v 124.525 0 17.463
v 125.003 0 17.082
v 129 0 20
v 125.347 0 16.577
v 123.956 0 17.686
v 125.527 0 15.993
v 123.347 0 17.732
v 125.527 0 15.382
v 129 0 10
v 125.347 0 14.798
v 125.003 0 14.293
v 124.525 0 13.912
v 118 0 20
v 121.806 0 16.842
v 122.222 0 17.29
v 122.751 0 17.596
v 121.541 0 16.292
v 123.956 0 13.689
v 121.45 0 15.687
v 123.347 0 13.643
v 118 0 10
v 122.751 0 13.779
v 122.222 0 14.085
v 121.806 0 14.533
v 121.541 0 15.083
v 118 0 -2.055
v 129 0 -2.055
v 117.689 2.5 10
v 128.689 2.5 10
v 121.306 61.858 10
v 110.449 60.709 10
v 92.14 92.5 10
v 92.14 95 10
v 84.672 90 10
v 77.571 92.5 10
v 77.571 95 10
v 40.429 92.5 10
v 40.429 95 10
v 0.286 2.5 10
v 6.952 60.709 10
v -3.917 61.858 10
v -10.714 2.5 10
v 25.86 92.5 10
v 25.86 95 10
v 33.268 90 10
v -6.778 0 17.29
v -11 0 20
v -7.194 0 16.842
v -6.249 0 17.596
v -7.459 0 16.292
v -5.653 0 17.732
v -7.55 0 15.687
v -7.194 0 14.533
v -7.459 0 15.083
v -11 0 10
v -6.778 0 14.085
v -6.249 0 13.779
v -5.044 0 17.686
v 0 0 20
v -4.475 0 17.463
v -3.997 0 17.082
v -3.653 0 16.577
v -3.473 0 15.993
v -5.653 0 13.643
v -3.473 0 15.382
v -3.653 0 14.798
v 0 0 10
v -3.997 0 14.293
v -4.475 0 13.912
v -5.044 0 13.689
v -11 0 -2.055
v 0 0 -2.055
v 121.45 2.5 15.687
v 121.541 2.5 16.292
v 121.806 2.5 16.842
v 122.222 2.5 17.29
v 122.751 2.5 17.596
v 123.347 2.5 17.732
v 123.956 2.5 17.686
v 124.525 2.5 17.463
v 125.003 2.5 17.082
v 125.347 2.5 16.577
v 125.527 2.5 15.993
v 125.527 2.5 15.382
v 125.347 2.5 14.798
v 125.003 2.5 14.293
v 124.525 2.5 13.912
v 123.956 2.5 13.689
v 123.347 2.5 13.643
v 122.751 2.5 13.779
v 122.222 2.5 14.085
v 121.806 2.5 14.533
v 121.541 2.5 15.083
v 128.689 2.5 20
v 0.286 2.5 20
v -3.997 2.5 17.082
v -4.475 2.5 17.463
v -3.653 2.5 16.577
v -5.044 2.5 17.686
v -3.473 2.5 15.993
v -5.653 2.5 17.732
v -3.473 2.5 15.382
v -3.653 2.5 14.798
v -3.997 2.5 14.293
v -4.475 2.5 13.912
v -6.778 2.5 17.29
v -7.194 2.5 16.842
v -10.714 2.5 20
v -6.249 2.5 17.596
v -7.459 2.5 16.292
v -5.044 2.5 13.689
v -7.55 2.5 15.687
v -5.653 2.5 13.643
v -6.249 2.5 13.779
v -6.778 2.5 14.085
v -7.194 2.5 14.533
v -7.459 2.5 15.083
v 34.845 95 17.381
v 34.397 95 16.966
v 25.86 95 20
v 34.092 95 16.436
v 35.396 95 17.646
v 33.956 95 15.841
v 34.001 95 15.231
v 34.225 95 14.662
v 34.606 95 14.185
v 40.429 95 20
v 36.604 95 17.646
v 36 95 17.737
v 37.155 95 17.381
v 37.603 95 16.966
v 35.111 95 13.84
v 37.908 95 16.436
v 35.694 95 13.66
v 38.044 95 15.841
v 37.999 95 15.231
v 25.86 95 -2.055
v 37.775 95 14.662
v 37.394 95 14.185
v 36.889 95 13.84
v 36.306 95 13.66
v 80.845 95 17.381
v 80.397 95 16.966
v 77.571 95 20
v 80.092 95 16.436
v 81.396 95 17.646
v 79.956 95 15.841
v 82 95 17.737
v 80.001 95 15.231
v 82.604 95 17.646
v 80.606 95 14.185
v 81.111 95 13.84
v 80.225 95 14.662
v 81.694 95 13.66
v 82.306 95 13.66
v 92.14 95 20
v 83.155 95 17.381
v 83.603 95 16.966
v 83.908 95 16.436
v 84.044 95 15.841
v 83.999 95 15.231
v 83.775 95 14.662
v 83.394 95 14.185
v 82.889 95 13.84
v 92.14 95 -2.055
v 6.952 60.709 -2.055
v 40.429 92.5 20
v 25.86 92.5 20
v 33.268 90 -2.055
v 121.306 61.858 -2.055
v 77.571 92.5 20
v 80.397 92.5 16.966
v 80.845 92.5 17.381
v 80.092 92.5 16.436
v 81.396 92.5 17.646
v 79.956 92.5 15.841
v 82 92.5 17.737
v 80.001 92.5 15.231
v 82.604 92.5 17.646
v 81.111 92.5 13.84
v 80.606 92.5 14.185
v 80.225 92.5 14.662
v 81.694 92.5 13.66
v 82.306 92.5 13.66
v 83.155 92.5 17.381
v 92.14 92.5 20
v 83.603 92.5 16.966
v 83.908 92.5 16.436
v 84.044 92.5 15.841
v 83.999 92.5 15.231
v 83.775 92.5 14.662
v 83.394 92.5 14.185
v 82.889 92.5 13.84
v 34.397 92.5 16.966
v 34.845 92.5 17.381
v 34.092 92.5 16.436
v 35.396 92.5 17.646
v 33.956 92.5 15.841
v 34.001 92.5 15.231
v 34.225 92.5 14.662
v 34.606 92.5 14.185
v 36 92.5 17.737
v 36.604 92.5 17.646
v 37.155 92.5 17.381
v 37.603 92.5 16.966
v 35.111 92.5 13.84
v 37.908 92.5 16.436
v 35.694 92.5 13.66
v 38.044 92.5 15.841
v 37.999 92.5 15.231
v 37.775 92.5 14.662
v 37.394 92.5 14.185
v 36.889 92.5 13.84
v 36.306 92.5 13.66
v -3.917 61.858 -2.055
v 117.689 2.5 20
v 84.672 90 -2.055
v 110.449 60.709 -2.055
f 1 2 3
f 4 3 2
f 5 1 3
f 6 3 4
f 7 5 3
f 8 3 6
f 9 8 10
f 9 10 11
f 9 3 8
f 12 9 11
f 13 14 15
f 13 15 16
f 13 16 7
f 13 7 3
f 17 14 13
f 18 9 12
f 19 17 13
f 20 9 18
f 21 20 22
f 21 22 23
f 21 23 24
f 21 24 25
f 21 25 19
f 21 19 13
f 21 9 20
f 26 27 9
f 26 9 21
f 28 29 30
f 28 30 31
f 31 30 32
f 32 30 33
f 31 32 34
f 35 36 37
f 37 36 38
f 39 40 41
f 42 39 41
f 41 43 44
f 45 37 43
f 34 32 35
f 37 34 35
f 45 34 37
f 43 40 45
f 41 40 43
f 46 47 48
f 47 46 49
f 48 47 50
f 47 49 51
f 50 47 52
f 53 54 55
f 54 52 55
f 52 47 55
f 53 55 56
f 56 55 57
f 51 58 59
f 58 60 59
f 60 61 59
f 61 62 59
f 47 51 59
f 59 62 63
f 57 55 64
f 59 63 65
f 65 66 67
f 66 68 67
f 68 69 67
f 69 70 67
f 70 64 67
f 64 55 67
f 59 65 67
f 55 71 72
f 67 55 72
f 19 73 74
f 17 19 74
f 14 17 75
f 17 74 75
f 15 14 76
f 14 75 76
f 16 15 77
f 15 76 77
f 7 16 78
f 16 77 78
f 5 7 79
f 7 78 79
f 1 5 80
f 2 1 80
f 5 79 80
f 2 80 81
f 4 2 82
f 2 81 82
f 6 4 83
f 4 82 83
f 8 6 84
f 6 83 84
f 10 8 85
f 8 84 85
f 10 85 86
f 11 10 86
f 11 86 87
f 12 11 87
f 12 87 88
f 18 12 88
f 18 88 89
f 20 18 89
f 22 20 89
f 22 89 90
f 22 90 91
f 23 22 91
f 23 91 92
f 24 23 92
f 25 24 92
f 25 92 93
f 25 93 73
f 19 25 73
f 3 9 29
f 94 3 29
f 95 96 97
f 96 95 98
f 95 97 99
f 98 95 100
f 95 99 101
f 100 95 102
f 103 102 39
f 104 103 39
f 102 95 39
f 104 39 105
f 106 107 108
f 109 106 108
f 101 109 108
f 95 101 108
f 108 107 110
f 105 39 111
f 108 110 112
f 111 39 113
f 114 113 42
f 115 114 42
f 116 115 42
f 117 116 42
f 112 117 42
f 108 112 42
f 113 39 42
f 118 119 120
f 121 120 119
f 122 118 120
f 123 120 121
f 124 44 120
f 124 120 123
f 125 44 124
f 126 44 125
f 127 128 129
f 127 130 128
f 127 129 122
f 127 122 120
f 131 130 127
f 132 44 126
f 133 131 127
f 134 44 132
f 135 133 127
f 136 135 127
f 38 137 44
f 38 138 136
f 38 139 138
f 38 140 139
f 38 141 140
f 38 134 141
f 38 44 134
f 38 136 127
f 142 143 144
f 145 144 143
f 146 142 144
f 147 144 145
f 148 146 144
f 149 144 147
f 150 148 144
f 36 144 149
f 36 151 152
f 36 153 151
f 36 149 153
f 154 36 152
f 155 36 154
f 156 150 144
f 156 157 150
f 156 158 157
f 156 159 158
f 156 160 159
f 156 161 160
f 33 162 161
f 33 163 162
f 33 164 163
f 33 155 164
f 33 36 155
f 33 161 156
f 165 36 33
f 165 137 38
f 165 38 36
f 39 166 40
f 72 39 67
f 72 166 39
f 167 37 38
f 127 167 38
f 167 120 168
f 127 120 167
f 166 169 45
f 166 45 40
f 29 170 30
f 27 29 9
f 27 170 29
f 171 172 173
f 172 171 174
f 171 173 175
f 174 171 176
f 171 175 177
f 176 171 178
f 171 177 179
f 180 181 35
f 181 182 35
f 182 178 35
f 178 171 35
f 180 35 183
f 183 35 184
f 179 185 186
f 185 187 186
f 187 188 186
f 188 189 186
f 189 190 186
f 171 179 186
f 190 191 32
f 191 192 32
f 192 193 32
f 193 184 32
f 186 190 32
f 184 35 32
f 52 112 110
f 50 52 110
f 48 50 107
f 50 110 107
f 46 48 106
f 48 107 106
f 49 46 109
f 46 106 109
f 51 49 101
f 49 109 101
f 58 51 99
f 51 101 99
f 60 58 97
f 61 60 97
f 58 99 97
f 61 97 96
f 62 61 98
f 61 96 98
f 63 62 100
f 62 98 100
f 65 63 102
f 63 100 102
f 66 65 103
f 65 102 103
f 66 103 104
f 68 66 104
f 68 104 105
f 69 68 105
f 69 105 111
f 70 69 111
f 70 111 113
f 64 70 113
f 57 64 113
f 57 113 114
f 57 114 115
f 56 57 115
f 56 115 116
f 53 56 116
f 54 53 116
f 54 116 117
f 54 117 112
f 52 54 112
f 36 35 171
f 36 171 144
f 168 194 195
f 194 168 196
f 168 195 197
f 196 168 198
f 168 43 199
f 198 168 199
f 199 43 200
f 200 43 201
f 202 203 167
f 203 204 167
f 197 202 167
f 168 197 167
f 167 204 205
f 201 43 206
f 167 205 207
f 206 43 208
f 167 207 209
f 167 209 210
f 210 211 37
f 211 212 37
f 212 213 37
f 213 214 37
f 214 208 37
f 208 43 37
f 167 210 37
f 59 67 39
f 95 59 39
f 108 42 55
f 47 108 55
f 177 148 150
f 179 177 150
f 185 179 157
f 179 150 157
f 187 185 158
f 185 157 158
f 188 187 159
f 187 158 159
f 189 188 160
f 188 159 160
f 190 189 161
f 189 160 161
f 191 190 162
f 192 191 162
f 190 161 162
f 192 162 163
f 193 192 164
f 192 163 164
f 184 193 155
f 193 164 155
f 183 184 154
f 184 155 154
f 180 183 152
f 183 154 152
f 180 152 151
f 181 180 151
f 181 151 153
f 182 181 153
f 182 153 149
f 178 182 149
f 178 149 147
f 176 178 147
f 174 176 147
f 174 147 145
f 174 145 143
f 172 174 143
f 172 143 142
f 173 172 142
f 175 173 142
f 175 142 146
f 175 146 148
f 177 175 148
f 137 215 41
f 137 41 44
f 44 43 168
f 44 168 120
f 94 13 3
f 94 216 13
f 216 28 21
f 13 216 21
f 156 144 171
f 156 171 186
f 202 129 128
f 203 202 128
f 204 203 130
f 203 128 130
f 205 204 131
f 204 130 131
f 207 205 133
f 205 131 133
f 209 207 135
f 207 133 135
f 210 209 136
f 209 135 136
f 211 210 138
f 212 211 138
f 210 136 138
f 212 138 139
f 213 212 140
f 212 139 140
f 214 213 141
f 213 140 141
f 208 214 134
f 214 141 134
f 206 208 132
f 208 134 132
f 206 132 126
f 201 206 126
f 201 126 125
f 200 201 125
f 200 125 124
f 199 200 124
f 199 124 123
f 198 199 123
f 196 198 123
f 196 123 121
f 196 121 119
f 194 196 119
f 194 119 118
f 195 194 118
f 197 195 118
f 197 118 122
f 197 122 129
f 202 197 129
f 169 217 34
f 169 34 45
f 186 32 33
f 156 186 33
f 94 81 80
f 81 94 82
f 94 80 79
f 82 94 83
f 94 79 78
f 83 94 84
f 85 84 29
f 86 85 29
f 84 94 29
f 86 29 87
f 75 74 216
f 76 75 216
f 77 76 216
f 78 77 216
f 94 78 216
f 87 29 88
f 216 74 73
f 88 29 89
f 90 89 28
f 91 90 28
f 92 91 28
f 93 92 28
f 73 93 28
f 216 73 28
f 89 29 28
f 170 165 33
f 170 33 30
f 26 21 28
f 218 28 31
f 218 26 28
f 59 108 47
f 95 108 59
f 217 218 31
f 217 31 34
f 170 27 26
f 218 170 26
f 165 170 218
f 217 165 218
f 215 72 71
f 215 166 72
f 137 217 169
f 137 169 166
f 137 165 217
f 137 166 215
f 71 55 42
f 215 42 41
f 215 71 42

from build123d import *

# Parameters (mm, degrees)
BOSS_EXTRUDE1_DEPTH      = 10
BOSS_EXTRUDE1_DEPTH_BACK = 2.055125775
BOSS_EXTRUDE2_DEPTH      = 10
SKETCH3_R                = 2.05
CUT_EXTRUDE1_DEPTH       = 10
SKETCH4_W                = 14.568281885
SKETCH4_H                = 2.5
BOSS_EXTRUDE3_DEPTH      = 10
SKETCH6_R                = 2.05
CUT_EXTRUDE2_DEPTH       = 10


with BuildPart() as part:
    # Sketch1 → Boss-Extrude1 (new, two sides: drawn at the far end of the back side and taken through both)
    with BuildSketch(Plane.XY.offset(-BOSS_EXTRUDE1_DEPTH_BACK)):
        Polygon((0, 0), (-11, 0), (-3.916610397, 61.857854845), (25.860231814, 95), (92.139768186, 95), (121.30603718, 61.857854845), (129, 0), (118, 0), (110.448917943, 60.709123335), (84.671902488, 90), (33.26848477, 90), (6.951847491, 60.709123335), align=None)
    extrude(amount=BOSS_EXTRUDE1_DEPTH + BOSS_EXTRUDE1_DEPTH_BACK)

    # Sketch2 → Boss-Extrude2 (add)
    with BuildSketch(Plane.XY.offset(10)):
        Polygon((-11, 0), (0, 0), (0.286276885, 2.5), (-10.713723115, 2.5), align=None)
        Polygon((118, 0), (129, 0), (128.689046652, 2.5), (117.689046652, 2.5), align=None)
    extrude(amount=BOSS_EXTRUDE2_DEPTH)

    # Sketch3 → Cut-Extrude1 (cut)
    with BuildSketch(Plane(origin=(0, 2.5, 0), x_dir=(1, 0, 0), z_dir=(0, 1, 0))):
        with Locations(Location((-5.5, -15.687372709, 0), (0, 0, 180))):
            Circle(SKETCH3_R)
        with Locations(Location((123.5, -15.687372709, 0), (0, 0, 180))):
            Circle(SKETCH3_R)
    extrude(amount=-CUT_EXTRUDE1_DEPTH, mode=Mode.SUBTRACT)

    # Sketch4 → Boss-Extrude3 (add)
    with BuildSketch(Plane.XY.offset(10)):
        with Locations((33.144372757, 93.75)):
            Rectangle(SKETCH4_W, SKETCH4_H)
        with Locations((84.855627244, 93.75)):
            Rectangle(SKETCH4_W, SKETCH4_H)
    extrude(amount=BOSS_EXTRUDE3_DEPTH)

    # Sketch6 → Cut-Extrude2 (cut)
    with BuildSketch(Plane(origin=(0, 95, 0), x_dir=(1, 0, 0), z_dir=(0, 1, 0))):
        with Locations(Location((36, -15.687372709, 0), (0, 0, 270))):
            Circle(SKETCH6_R)
        with Locations(Location((82, -15.687372709, 0), (0, 0, 270))):
            Circle(SKETCH6_R)
    extrude(amount=-CUT_EXTRUDE2_DEPTH, mode=Mode.SUBTRACT)


solid = part.part
